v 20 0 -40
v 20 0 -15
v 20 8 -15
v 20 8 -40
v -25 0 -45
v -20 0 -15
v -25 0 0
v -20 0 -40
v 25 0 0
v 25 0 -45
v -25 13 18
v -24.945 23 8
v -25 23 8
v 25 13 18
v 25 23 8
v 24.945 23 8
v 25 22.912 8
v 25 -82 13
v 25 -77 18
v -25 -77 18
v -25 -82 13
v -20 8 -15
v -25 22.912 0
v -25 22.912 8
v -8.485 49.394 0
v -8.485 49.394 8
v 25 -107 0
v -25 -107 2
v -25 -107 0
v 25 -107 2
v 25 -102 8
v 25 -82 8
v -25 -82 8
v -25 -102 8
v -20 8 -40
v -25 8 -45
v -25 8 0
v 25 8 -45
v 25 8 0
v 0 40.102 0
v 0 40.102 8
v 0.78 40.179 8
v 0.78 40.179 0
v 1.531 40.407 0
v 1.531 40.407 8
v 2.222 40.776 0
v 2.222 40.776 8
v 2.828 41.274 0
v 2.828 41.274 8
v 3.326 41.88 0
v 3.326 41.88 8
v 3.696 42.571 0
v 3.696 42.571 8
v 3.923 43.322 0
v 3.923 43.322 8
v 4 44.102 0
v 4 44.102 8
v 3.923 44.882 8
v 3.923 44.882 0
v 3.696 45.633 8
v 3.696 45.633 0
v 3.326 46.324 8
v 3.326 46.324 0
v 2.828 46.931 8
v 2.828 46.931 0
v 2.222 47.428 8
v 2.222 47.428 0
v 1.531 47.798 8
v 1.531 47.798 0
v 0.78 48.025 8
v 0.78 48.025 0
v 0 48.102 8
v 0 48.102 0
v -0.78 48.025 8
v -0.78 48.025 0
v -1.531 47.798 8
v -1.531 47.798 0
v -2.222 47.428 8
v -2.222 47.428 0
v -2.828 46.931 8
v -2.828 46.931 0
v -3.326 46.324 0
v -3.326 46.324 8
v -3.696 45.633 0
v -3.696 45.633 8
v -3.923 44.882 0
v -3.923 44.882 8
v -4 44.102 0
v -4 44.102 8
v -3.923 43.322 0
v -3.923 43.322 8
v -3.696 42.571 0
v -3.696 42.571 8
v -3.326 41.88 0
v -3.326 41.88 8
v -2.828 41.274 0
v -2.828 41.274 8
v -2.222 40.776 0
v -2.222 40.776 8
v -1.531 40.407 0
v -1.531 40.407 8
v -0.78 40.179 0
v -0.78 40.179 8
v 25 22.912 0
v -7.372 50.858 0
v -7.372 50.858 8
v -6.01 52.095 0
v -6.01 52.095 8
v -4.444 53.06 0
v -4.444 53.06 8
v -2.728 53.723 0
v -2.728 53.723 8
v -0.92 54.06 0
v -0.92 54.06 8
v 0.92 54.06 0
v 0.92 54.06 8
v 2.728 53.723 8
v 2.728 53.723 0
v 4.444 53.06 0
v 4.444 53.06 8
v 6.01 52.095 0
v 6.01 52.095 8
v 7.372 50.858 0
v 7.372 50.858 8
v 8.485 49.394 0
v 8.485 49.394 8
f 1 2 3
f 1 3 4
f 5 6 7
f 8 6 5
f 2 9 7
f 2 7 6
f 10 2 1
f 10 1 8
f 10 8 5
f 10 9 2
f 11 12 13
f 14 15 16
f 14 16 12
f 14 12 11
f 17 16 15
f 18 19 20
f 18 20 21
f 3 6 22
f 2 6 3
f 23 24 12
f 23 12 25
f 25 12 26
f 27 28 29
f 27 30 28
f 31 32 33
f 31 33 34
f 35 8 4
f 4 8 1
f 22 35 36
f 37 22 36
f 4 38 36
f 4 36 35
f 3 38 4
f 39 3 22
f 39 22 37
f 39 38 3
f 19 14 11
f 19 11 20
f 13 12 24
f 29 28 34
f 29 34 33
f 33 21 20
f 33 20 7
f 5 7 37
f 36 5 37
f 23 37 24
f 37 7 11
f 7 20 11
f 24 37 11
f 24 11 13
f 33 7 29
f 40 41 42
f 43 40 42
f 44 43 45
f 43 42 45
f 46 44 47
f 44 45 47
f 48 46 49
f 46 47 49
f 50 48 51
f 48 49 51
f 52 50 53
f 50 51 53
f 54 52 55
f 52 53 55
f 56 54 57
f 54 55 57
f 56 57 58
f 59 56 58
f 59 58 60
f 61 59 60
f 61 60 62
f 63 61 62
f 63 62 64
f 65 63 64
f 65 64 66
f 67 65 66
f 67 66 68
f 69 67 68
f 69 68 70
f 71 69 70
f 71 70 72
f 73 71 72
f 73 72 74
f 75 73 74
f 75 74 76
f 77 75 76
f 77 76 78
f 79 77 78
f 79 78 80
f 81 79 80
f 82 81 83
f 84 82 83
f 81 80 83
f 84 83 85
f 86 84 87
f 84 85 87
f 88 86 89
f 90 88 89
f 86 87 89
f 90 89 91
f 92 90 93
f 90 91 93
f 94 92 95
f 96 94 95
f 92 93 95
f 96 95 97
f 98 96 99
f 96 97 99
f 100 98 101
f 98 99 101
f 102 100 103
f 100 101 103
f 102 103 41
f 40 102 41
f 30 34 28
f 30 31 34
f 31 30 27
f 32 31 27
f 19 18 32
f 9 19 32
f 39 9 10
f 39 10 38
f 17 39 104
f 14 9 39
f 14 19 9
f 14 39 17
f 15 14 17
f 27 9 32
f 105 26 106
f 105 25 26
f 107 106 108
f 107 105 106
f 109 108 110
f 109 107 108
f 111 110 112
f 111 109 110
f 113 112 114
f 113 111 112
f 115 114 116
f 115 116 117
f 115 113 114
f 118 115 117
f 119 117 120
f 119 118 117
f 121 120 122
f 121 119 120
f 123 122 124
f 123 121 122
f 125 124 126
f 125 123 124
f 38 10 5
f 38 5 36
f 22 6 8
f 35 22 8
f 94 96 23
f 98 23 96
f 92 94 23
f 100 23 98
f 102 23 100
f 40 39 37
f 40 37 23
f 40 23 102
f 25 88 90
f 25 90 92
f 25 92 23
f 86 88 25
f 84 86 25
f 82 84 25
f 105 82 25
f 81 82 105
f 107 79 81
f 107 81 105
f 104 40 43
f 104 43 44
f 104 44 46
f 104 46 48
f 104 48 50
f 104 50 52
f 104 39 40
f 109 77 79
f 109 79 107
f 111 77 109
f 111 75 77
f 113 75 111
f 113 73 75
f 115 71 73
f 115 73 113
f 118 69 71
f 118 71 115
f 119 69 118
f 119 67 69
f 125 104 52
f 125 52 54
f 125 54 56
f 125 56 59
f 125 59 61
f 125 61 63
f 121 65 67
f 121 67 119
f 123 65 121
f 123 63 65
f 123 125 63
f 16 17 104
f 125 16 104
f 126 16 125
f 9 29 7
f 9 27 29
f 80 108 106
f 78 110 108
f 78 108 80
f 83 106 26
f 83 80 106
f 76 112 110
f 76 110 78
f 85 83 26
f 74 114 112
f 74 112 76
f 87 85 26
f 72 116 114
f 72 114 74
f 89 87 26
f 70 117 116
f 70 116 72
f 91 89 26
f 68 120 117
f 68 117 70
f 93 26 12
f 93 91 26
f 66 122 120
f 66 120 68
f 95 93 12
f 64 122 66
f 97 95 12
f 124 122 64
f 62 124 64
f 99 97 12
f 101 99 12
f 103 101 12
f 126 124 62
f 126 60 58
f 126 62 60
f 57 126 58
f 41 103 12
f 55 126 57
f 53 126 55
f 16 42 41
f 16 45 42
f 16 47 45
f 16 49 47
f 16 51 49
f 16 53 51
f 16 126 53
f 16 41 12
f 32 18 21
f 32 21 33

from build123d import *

# Parameters (mm, degrees)
PAD_DEPTH       = 25
SKETCH001_W     = 25
SKETCH001_H     = 40
POCKET_DEPTH    = 63.001
POCKET001_DEPTH = 429.133955
FILLET_R        = 10
SKETCH003_R     = 4
POCKET002_DEPTH = 53.001


with BuildPart() as part:
    # Sketch → Pad (new body, symmetric)
    with BuildSketch(Plane.YZ):
        Polygon((-107, 0), (0, 0), (0, -45), (8, -45), (8, 0), (63, 0), (63, 8), (23, 8), (13, 18), (-77, 18), (-82, 13), (-82, 8), (-102, 8), (-107, 2), align=None)
    extrude(amount=PAD_DEPTH, both=True)

    # Sketch001 → Pocket (cut, through all)
    with BuildSketch(Plane(origin=(0, 0, 0), x_dir=(0, 0, -1), z_dir=(0, -1, 0))):
        with Locations((27.5, 0)):
            Rectangle(SKETCH001_W, SKETCH001_H)
    extrude(amount=-POCKET_DEPTH, mode=Mode.SUBTRACT)

    # Sketch002 → Pocket001 (cut, through all)
    with BuildSketch(Plane(origin=(0, 0, 8), x_dir=(0, -1, 0), z_dir=(0, 0, 1))):
        Polygon((-22.911764, -25), (-63, 0), (-63, -25), align=None)
    pocket001 = extrude(amount=-POCKET001_DEPTH, mode=Mode.SUBTRACT)

    # Mirrored: Pocket001 across Sketch002 H_Axis
    add(pocket001.mirror(Plane(origin=(0, 0, 8), x_dir=(0, 0, 1), z_dir=(1, 0, 0))), mode=Mode.SUBTRACT)

    # Fillet
    fillet_edges = [part.edges().sort_by_distance(p)[0] for p in [
        (0, 63, 4),
    ]]
    fillet(fillet_edges, radius=FILLET_R)

    # Sketch003 → Pocket002 (cut, through all)
    with BuildSketch(Plane(origin=(0, 0, 8), x_dir=(0, -1, 0), z_dir=(0, 0, 1))):
        with Locations((-44.102099, 0)):
            Circle(SKETCH003_R)
    extrude(amount=-POCKET002_DEPTH, mode=Mode.SUBTRACT)


solid = part.part
